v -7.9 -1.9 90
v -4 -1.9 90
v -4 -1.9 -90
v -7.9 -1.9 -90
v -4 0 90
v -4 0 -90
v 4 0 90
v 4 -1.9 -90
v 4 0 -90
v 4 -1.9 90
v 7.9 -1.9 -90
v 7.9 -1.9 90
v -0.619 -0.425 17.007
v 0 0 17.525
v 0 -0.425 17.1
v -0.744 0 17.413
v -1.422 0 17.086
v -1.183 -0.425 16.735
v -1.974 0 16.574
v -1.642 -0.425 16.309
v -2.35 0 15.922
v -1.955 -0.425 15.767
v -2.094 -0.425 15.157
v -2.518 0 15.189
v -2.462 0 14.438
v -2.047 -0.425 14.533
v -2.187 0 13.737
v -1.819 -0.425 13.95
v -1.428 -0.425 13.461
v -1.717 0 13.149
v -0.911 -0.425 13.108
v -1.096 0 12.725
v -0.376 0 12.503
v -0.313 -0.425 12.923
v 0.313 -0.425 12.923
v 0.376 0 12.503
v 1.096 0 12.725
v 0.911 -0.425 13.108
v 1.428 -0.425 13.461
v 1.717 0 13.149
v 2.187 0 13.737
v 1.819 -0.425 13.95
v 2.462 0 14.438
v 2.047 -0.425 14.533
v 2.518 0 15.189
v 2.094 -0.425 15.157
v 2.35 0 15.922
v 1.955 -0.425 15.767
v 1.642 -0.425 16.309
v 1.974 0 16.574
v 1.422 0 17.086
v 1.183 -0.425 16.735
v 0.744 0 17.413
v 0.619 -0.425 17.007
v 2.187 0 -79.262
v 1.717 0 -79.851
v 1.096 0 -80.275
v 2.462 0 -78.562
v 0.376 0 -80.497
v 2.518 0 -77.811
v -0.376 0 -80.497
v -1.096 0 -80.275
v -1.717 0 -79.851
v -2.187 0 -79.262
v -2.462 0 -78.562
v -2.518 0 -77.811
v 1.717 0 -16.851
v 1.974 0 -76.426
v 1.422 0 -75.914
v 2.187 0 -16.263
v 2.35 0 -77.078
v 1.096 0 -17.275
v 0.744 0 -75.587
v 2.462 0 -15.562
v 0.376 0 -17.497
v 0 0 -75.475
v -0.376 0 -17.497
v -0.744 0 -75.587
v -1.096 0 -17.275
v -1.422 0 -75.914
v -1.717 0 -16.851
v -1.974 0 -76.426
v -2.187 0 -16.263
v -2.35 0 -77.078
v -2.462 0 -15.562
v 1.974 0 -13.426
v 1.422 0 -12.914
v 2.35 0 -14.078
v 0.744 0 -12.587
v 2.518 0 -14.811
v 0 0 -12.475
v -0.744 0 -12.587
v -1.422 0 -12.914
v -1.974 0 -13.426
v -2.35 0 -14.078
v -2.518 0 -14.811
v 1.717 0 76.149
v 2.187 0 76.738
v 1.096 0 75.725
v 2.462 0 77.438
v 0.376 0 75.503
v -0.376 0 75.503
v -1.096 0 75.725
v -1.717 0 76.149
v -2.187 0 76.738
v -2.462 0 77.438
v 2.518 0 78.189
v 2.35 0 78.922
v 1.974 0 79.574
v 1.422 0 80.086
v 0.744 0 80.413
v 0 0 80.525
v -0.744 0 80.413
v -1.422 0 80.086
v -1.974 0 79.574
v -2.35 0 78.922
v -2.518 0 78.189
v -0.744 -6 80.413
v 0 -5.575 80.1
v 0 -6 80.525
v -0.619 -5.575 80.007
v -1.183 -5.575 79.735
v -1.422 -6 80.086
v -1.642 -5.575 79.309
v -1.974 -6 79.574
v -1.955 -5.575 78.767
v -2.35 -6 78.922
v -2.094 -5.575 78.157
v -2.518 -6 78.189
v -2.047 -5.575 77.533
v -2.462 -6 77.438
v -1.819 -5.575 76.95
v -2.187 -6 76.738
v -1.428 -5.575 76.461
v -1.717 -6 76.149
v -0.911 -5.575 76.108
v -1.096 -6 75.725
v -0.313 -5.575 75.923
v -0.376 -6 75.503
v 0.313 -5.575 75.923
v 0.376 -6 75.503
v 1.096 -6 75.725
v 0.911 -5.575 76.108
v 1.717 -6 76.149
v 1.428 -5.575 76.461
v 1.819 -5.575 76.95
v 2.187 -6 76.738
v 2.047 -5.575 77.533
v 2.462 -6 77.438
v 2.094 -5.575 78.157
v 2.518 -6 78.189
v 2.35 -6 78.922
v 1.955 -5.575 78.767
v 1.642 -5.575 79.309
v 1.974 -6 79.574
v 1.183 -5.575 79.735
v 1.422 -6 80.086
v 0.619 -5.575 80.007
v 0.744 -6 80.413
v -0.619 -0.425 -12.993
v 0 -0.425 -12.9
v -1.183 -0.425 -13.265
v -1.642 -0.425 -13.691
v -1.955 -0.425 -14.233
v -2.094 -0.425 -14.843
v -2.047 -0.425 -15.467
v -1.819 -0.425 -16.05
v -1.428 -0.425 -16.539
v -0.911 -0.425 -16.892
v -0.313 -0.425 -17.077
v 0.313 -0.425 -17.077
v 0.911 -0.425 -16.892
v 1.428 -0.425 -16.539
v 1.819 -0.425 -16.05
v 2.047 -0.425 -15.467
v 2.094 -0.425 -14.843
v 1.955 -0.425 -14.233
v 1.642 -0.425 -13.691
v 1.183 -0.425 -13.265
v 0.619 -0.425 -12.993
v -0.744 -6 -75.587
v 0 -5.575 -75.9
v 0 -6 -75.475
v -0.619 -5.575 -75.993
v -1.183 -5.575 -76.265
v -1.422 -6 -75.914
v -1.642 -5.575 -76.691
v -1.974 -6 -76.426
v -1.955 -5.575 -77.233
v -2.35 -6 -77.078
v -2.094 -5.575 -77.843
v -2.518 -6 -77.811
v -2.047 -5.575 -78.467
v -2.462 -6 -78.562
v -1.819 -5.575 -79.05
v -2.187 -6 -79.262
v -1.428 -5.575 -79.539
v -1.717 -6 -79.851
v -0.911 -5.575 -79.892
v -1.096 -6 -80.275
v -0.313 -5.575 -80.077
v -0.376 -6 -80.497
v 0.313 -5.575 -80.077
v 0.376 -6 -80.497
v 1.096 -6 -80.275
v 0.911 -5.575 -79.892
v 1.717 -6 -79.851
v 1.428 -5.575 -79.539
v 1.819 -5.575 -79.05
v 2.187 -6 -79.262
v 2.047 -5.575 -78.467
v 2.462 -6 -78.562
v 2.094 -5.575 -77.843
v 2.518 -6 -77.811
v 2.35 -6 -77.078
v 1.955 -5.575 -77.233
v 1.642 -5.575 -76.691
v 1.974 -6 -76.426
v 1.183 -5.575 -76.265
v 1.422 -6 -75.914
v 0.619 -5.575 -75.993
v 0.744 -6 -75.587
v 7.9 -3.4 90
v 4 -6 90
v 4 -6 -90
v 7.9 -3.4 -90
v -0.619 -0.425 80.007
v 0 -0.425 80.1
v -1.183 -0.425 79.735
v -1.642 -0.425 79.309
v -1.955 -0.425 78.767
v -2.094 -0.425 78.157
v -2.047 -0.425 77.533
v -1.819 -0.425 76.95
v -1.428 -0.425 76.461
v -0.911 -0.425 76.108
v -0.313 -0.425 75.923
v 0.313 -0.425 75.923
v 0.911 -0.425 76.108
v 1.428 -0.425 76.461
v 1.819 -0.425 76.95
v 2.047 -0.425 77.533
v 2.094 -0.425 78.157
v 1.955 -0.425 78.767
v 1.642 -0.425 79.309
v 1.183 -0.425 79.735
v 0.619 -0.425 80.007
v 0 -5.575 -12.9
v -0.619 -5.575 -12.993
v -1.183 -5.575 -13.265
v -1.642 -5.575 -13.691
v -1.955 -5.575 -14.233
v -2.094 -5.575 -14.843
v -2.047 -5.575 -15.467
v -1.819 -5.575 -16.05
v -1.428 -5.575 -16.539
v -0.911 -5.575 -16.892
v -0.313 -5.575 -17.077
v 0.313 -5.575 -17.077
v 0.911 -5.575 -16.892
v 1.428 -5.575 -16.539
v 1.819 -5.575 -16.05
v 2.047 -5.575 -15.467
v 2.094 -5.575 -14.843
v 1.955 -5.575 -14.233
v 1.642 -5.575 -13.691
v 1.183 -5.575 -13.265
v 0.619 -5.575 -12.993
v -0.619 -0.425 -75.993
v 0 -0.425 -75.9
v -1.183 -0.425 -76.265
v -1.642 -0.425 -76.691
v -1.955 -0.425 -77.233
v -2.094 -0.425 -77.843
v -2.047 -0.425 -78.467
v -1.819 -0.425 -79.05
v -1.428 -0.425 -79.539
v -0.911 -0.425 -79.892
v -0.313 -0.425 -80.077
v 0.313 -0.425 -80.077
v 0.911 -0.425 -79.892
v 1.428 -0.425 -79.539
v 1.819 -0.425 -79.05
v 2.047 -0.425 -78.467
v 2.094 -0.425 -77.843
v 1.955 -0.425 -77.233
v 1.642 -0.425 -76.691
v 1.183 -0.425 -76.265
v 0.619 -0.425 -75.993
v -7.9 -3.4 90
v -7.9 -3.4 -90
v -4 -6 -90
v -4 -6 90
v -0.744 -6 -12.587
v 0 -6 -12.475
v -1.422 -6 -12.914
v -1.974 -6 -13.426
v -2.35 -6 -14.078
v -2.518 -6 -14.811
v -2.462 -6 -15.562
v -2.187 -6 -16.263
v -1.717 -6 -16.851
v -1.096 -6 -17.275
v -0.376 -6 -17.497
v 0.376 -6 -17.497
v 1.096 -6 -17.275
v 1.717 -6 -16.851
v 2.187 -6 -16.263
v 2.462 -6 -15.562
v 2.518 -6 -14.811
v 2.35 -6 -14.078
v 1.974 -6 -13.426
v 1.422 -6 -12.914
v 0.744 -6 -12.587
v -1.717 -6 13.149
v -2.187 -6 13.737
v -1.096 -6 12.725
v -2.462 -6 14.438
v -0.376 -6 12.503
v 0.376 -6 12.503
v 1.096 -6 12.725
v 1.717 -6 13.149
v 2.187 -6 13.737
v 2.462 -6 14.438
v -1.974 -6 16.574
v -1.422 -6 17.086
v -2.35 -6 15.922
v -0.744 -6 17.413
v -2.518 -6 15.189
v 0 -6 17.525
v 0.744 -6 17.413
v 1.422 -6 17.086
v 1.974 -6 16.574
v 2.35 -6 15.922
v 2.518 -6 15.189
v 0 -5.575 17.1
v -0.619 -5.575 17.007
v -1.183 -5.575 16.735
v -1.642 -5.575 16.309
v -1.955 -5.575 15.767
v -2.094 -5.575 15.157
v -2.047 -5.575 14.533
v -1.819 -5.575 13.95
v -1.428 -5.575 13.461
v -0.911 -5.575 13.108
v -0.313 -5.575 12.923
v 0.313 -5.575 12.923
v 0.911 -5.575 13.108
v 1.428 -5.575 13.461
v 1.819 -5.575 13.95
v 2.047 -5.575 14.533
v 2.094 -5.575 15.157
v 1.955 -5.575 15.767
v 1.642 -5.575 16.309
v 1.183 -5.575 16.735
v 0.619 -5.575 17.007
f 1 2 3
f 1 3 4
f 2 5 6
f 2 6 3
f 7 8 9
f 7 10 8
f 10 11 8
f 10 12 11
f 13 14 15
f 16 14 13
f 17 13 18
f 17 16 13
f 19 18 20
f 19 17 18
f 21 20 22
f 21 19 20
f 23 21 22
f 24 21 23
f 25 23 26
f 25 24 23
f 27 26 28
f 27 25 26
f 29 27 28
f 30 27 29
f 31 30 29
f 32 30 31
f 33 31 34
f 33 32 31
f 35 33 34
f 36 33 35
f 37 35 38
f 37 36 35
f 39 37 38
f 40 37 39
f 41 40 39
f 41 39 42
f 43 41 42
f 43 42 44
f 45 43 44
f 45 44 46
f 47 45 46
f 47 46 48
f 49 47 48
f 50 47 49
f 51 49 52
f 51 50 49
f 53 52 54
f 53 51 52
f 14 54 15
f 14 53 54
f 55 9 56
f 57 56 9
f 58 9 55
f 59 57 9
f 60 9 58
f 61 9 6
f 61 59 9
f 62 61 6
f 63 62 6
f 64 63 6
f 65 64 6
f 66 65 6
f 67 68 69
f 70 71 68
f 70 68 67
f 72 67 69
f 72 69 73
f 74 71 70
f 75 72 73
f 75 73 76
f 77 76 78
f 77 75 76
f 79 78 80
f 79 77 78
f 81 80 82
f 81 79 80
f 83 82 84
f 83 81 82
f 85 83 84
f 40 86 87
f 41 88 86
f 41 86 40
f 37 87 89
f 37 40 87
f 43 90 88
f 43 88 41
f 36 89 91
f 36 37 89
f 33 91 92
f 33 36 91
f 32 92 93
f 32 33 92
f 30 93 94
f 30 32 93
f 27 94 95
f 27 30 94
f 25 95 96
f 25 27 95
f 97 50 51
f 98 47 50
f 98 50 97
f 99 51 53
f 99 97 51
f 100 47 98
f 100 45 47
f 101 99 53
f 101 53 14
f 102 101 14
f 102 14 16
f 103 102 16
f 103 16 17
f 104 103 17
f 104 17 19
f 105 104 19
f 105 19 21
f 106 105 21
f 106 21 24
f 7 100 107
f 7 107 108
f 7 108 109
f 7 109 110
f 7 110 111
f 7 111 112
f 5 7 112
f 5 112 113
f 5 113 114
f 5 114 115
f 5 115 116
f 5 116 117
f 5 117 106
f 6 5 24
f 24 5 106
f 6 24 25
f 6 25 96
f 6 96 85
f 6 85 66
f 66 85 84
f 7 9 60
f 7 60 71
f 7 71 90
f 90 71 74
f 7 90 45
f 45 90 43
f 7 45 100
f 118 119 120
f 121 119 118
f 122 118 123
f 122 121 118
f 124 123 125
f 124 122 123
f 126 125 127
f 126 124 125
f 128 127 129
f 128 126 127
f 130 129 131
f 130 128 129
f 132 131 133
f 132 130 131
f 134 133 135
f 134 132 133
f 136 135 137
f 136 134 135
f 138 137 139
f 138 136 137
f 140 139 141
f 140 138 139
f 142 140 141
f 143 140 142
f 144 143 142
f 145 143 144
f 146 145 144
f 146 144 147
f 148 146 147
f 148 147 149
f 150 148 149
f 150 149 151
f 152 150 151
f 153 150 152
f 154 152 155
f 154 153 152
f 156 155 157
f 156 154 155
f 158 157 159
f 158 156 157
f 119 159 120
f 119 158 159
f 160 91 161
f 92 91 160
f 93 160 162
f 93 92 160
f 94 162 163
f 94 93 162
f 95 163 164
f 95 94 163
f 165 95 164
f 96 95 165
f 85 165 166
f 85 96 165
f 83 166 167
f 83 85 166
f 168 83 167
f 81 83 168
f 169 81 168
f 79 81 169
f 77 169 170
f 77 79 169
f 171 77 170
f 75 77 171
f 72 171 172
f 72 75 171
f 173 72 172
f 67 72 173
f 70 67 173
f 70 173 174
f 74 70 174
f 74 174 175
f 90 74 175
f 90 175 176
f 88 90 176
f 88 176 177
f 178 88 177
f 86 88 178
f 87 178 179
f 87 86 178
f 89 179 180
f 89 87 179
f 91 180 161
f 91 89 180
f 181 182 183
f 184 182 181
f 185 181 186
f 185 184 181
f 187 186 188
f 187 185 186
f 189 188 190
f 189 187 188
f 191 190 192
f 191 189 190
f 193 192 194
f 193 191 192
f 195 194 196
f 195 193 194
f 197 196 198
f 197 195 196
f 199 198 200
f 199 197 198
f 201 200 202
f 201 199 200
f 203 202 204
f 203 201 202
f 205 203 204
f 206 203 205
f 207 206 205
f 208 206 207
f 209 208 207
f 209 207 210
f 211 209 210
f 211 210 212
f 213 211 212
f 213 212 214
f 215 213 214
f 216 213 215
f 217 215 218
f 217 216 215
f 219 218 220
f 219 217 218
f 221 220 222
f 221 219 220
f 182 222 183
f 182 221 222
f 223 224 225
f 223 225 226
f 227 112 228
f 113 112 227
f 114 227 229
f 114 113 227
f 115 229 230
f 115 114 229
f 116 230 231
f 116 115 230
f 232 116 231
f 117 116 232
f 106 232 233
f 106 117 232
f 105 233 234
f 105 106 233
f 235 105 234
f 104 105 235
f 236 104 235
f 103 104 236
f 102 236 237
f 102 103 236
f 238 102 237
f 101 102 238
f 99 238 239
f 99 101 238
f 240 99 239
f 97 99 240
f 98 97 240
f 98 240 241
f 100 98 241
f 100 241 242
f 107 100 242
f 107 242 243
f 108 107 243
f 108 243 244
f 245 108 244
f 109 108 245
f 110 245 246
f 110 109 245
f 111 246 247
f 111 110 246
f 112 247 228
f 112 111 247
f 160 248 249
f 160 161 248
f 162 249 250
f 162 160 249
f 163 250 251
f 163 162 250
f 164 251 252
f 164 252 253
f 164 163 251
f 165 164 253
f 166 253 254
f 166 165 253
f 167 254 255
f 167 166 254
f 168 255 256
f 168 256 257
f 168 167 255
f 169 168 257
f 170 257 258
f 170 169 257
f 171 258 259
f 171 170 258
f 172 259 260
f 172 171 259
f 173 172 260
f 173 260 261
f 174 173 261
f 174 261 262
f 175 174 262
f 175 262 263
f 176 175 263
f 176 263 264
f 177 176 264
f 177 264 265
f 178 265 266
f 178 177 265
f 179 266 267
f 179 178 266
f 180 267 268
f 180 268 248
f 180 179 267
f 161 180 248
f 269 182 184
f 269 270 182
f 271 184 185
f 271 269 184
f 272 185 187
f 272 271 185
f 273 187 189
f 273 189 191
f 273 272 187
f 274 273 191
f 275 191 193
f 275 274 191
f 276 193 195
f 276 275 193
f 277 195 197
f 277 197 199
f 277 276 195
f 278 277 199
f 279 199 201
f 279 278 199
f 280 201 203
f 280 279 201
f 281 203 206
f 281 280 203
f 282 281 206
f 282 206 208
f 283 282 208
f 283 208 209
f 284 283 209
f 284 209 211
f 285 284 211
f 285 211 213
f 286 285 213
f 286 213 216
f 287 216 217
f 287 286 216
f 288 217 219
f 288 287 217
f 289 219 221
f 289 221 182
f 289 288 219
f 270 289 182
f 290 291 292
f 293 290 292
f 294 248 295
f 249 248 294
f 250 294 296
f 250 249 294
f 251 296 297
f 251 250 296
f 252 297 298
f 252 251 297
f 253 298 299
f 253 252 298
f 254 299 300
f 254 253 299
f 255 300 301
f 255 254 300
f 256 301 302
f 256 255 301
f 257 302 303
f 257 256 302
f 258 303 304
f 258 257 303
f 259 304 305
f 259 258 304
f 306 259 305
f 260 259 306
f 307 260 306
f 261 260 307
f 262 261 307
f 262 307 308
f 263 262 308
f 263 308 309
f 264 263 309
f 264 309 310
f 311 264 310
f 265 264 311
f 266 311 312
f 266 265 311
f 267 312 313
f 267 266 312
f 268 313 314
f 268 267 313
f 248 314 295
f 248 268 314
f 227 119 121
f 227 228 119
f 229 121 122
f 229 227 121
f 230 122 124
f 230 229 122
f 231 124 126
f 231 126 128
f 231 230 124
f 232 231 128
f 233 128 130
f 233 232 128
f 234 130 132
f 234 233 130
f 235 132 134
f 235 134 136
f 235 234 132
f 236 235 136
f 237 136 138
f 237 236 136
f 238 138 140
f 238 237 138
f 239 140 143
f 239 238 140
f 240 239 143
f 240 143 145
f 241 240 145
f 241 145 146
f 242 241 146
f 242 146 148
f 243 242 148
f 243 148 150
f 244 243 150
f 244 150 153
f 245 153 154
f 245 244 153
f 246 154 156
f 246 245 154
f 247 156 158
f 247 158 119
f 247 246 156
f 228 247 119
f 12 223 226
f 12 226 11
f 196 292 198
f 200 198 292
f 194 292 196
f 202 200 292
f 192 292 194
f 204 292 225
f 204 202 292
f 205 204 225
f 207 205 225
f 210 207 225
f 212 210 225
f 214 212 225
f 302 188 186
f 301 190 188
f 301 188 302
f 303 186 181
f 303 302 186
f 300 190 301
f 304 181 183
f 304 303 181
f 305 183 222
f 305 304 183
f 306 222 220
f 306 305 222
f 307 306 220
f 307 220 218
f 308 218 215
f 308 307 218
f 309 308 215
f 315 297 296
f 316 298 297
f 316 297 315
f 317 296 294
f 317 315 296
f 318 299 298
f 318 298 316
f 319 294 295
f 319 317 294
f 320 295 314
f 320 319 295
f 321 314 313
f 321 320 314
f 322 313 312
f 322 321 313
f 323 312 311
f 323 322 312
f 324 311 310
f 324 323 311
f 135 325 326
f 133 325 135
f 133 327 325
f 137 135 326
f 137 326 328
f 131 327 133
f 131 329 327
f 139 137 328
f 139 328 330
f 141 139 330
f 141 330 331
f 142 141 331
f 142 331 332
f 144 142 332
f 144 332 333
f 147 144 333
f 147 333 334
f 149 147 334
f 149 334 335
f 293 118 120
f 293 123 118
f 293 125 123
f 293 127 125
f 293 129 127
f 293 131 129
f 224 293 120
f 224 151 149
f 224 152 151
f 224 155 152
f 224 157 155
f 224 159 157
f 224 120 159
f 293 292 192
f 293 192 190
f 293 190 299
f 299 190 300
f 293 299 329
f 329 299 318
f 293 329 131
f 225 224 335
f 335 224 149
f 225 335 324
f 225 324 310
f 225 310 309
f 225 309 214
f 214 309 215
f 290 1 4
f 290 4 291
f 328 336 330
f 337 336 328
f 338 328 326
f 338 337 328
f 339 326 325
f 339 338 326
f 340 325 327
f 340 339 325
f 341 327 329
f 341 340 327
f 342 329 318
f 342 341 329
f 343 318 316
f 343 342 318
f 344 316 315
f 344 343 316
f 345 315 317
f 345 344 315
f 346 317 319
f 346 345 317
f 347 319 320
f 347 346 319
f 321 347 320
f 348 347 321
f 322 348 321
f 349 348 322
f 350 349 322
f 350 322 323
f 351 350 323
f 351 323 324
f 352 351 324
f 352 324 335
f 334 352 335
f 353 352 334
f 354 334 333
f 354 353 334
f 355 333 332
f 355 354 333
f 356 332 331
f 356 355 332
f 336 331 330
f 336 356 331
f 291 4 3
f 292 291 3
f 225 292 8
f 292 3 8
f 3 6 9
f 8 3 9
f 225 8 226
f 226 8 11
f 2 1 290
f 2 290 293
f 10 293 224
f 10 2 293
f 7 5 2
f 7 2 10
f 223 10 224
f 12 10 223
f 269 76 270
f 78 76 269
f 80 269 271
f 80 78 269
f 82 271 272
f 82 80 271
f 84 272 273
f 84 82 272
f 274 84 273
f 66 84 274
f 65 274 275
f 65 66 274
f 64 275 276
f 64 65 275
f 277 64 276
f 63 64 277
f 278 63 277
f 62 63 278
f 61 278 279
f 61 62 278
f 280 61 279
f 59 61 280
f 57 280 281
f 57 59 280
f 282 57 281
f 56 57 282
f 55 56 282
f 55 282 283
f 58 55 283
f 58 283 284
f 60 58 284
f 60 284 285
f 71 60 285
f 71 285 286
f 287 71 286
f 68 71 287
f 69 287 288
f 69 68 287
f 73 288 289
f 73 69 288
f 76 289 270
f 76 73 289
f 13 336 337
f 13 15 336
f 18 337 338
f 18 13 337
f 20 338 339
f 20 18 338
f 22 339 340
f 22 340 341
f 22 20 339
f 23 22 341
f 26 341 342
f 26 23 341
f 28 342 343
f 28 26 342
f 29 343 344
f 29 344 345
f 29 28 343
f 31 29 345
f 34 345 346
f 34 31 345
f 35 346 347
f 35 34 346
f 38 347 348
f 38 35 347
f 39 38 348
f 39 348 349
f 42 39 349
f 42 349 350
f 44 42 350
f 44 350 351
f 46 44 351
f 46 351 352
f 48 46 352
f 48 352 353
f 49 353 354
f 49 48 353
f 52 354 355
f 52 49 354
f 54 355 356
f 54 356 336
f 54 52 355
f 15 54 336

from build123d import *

# Parameters (mm, degrees)
EXTRUDE_1_DEPTH            = 90
HOLE_WIZARD_M52_AT_2_COUNT = 2
HOLE_WIZARD_M52_AT_2_PITCH = 63
HOLE_WIZARD_M52_AT_3_COUNT = 2
HOLE_WIZARD_M52_AT_3_PITCH = 93
HOLE_WIZARD_M52_AT_4_COUNT = 2
HOLE_WIZARD_M52_AT_4_PITCH = 156


with BuildPart() as part:
    # Эскиз1 → Бобышка-Вытянуть1 (new body, symmetric)
    with BuildSketch(Plane.XY):
        Polygon((4, 0), (-4, 0), (-4, -1.9), (-7.9, -1.9), (-7.9, -3.4), (-4, -6), (4, -6), (7.9, -3.4), (7.9, -1.9), (4, -1.9), align=None)
    extrude(amount=EXTRUDE_1_DEPTH, both=True)

    # Эскиз6 → Отверстие обработанное метчиком M52 (revolve, cut)
    with BuildSketch(Plane(origin=(0, 0, -78), x_dir=(0, 0, 1), z_dir=(1, 0, 0))):
        Polygon((0, 0), (0, 6), (2.525, 6), (2.1, 5.575), (2.1, 0.425), (2.525, 0), align=None)
    hole_wizard_m52 = revolve(axis=Axis((0, 6.35, -78), (0, -1, 0)), mode=Mode.SUBTRACT)

    # Отверстие обработанное метчиком M52 at 2: Отверстие обработанное метчиком M52 ×2
    with Locations(*[(0, 0, i * HOLE_WIZARD_M52_AT_2_PITCH) for i in range(1, HOLE_WIZARD_M52_AT_2_COUNT)]):
        add(hole_wizard_m52, mode=Mode.SUBTRACT)

    # Отверстие обработанное метчиком M52 at 3: Отверстие обработанное метчиком M52 ×2
    with Locations(*[(0, 0, i * HOLE_WIZARD_M52_AT_3_PITCH) for i in range(1, HOLE_WIZARD_M52_AT_3_COUNT)]):
        add(hole_wizard_m52, mode=Mode.SUBTRACT)

    # Отверстие обработанное метчиком M52 at 4: Отверстие обработанное метчиком M52 ×2
    with Locations(*[(0, 0, i * HOLE_WIZARD_M52_AT_4_PITCH) for i in range(1, HOLE_WIZARD_M52_AT_4_COUNT)]):
        add(hole_wizard_m52, mode=Mode.SUBTRACT)


solid = part.part
